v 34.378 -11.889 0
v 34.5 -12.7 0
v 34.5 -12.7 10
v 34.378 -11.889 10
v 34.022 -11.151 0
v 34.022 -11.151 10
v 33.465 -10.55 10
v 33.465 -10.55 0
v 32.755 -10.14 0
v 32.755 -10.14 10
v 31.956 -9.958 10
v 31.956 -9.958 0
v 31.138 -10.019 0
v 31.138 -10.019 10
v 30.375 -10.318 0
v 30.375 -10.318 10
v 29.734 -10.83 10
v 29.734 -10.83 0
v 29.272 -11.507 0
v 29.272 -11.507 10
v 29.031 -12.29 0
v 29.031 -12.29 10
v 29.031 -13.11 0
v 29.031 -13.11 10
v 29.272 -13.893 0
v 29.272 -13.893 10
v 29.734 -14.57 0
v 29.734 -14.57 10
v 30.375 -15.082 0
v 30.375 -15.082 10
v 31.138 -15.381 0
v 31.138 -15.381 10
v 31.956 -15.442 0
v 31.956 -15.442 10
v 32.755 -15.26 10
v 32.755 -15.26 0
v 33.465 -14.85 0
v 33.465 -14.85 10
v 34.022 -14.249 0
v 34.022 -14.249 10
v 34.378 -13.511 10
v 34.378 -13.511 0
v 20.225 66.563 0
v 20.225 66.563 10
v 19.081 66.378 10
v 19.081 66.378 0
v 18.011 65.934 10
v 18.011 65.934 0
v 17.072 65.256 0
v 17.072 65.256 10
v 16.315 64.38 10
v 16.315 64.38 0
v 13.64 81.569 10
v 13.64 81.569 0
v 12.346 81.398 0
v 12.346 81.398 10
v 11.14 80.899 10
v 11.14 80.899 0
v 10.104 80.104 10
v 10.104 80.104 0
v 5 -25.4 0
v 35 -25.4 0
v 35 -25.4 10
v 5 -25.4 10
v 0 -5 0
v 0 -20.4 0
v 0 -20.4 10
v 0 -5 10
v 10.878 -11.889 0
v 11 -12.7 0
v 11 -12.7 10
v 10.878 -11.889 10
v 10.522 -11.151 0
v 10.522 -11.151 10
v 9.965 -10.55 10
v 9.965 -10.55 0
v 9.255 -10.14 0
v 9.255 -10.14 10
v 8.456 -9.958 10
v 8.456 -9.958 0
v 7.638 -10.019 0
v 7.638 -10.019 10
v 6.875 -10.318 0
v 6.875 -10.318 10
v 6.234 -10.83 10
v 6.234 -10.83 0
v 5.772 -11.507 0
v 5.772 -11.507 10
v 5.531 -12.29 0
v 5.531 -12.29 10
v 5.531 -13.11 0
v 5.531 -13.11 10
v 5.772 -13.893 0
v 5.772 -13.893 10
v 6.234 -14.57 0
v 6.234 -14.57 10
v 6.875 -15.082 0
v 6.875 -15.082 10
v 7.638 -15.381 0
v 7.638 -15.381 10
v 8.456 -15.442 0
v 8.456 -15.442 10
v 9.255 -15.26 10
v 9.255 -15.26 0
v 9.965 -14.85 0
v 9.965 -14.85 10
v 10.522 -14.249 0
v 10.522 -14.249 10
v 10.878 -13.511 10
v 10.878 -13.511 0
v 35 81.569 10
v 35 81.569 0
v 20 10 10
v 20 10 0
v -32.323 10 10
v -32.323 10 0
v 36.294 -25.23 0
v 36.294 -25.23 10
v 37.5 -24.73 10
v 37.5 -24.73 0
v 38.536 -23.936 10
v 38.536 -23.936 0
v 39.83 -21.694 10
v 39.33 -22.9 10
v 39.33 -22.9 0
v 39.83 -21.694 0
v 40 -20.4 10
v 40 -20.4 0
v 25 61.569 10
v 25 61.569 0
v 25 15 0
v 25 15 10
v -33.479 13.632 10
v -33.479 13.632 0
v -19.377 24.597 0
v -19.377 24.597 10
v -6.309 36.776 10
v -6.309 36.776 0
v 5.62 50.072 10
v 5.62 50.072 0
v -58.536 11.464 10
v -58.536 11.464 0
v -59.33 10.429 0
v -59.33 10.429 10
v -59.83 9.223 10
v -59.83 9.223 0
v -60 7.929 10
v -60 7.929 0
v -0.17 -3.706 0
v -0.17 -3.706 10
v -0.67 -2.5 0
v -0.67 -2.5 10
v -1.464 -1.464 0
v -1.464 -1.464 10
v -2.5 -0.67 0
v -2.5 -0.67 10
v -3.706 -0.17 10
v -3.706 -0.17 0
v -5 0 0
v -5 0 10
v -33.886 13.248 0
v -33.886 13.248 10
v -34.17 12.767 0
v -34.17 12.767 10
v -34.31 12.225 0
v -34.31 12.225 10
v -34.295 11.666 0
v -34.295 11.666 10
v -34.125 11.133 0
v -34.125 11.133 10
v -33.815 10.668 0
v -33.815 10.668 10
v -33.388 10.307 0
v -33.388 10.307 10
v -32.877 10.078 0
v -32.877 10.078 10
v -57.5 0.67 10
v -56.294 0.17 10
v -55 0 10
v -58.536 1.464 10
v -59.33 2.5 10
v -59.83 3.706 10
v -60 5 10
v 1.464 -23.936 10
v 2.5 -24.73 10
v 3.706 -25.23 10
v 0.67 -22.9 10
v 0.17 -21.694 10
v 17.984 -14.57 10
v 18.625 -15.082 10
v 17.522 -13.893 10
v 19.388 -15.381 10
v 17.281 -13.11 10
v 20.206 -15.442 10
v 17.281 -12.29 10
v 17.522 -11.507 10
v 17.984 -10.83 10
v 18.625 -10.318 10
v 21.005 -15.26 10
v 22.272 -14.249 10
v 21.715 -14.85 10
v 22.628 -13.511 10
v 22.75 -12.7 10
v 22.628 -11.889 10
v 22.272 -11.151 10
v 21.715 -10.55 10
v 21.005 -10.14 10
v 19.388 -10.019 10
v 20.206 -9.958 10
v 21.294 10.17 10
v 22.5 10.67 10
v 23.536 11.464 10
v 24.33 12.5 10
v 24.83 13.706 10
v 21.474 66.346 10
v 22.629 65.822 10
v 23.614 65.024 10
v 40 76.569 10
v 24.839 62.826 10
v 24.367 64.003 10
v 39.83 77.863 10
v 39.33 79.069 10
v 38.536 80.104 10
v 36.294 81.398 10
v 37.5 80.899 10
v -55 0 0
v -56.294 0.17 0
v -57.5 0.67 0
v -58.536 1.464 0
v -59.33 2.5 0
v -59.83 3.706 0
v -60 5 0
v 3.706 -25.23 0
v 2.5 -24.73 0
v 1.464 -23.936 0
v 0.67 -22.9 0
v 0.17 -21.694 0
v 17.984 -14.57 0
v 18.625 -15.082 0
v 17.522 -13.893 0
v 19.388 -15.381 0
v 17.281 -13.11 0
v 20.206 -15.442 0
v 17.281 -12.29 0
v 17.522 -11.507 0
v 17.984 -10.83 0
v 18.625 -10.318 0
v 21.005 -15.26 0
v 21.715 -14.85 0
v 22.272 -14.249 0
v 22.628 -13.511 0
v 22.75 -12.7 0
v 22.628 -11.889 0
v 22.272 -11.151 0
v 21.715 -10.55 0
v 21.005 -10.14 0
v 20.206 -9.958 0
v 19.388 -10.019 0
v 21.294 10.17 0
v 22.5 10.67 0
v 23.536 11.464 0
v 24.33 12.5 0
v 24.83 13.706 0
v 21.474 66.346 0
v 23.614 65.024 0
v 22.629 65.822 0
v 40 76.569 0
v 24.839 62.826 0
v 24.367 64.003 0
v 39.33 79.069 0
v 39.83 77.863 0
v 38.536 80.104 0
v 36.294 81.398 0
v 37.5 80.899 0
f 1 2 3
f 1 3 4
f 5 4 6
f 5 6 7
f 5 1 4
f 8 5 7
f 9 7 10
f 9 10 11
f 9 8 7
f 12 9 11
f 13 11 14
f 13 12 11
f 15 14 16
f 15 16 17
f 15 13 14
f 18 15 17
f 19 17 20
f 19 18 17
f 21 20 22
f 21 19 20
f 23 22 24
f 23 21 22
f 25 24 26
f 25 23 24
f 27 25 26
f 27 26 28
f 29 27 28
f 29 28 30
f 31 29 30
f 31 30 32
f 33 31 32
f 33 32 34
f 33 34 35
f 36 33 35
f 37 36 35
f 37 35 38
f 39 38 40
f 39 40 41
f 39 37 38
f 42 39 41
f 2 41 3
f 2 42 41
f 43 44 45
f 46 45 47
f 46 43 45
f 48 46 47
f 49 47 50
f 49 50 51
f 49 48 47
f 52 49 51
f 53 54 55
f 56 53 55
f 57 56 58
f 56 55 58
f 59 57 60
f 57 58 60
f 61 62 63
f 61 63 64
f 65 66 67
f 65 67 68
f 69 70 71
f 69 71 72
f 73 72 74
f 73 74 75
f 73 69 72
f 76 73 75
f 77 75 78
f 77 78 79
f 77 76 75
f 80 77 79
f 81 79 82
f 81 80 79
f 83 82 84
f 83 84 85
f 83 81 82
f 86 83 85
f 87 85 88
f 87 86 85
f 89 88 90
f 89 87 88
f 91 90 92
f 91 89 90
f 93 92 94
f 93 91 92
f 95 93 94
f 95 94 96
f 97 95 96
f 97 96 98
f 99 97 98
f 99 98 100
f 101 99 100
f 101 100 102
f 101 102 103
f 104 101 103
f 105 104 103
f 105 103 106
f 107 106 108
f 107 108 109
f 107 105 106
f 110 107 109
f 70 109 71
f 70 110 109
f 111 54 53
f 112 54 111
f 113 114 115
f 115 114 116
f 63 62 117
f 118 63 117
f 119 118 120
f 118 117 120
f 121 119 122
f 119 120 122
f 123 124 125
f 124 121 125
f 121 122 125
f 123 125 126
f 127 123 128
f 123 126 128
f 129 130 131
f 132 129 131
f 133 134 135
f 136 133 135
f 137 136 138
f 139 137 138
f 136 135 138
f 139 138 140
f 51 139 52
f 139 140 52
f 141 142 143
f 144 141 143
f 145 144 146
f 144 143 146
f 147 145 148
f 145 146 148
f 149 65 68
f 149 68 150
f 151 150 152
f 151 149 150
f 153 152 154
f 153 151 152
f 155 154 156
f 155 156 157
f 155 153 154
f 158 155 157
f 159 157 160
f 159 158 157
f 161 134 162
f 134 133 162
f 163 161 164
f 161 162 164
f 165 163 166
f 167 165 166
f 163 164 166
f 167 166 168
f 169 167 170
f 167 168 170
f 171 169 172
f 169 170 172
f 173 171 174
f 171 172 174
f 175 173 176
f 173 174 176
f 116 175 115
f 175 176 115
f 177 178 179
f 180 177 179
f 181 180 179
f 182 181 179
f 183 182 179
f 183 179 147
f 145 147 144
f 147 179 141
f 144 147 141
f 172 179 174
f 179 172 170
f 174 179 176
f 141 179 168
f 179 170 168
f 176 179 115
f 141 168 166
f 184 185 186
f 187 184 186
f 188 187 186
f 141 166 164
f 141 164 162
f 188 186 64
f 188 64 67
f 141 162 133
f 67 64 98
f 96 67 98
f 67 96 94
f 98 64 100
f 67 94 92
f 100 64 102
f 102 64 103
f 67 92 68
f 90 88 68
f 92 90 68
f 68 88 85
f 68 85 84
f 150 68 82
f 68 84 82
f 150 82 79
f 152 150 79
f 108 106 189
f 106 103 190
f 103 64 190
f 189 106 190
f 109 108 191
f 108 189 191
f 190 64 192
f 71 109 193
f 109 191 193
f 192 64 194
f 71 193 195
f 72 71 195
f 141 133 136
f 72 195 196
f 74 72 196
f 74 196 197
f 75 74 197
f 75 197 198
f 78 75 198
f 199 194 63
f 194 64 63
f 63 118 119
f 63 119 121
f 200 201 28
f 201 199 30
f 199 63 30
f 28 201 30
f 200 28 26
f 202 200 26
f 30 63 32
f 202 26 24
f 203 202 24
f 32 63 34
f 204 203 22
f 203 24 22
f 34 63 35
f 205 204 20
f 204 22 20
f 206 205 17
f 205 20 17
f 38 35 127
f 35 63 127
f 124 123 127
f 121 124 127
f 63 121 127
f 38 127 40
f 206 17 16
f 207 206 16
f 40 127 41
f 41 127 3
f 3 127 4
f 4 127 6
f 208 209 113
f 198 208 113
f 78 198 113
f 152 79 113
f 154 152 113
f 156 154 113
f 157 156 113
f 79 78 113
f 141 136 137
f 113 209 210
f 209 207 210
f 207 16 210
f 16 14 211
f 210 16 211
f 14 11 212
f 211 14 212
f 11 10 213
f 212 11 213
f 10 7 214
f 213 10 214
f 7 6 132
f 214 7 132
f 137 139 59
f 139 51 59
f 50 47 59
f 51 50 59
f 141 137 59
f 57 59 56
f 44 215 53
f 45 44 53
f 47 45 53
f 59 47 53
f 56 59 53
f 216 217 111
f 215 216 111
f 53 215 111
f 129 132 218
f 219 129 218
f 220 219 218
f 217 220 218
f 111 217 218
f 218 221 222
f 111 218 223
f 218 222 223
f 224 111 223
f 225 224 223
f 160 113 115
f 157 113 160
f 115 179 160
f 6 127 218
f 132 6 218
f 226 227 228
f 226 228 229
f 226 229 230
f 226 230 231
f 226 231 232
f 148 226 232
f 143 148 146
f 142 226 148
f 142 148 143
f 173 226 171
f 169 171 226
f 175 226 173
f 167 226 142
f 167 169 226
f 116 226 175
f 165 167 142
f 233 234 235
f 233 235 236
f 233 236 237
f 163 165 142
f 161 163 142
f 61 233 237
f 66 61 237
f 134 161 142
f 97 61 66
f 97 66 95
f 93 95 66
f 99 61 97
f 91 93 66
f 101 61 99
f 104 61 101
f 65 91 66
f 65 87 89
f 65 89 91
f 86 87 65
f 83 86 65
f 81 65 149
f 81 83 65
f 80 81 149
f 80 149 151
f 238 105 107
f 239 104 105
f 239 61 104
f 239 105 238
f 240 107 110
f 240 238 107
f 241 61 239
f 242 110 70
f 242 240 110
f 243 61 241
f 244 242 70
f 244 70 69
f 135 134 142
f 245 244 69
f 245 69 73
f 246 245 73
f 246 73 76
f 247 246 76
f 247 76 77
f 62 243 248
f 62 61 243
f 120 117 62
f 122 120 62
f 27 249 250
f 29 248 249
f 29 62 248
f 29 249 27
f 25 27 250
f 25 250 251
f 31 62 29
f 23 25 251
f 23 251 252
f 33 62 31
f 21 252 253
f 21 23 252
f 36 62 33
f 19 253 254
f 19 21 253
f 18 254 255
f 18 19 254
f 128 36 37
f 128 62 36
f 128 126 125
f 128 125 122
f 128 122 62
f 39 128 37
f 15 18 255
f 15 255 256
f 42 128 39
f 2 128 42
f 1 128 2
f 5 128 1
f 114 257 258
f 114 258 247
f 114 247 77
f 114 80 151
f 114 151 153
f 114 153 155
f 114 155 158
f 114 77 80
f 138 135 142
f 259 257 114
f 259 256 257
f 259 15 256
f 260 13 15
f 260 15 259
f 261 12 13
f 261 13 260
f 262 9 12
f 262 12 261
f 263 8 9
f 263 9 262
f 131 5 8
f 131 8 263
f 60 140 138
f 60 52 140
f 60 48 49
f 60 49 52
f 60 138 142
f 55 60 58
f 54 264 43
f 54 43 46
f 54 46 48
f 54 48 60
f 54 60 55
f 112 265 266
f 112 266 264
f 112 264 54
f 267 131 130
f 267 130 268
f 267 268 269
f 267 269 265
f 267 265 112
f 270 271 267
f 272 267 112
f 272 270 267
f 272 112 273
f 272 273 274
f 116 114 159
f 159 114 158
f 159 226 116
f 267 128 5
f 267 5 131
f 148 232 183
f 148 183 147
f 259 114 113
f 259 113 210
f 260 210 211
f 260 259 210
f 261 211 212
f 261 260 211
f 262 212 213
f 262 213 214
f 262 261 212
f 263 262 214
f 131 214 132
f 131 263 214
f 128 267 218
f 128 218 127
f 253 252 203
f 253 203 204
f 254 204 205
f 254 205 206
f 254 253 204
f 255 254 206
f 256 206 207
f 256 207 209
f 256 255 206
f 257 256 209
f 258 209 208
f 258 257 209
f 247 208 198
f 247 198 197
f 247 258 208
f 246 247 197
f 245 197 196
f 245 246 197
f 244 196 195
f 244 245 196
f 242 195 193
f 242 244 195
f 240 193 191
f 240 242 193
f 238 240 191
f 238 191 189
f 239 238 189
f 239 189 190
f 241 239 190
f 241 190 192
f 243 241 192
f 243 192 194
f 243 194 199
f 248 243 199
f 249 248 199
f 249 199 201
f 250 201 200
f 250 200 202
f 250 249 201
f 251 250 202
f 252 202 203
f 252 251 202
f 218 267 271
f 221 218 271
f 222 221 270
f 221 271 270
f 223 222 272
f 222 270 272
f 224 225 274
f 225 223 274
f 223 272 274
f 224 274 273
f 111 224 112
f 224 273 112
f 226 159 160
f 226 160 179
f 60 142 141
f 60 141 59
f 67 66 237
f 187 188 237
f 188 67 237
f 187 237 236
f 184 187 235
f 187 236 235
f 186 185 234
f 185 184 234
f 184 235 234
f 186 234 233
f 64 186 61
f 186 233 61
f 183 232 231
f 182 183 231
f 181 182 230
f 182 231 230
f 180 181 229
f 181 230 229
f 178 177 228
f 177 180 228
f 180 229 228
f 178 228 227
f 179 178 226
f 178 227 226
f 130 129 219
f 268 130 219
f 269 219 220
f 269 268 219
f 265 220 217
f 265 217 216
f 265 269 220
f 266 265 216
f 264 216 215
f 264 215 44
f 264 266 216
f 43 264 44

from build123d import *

# Parameters (mm, degrees)
SKETCH1_R           = 2.75
BOSS_EXTRUDE1_DEPTH = 10
FILLET1_R           = 5
FILLET2_R           = 2


with BuildPart() as part:
    # Sketch1 → Boss-Extrude1 (new body)
    with BuildSketch(Plane.XY):
        Polygon((-60, 10), (11.568542495, 81.568542495), (40, 81.568542495), (40, -25.4), (0, -25.4), (0, 0), (-60, 0), align=None)
        with Locations((8.25, -12.7)):
            Circle(SKETCH1_R, mode=Mode.SUBTRACT)
        with Locations((20, -12.7)):
            Circle(SKETCH1_R, mode=Mode.SUBTRACT)
        with Locations((31.75, -12.7)):
            Circle(SKETCH1_R, mode=Mode.SUBTRACT)
        with BuildLine():
            Line((17.781745931, 66.568542495), (25, 66.568542495))
            Line((25, 66.568542495), (25, 10))
            Line((25, 10), (-38.786796564, 10))
            ThreePointArc((-38.786796564, 10), (-7.645233685, 35.426979616), (17.781745931, 66.568542495))
        make_face(mode=Mode.SUBTRACT)
    extrude(amount=BOSS_EXTRUDE1_DEPTH)

    # Fillet1
    # the kernel refuses this fillet: 5 mm, written as the material it adds along each edge
    with BuildSketch(Plane(origin=(17.781745931, 66.568542495, 0), x_dir=(-0.556881790774907, -0.8305917595927212, 0), z_dir=(0, 0, 1))) as fillet1_piece_1:
        with BuildLine():
            CenterArc((2.667557701, 4.999891542), FILLET1_R, 213.840425913, 55.782189142)
            Line((-1.485401097, 2.215482588), (0, 0))
            ThreePointArc((0, 0), (1.317312445, 0.004338327), (2.63462489, 0))
        make_face()
    extrude(amount=10)
    with BuildSketch(Plane(origin=(25, 66.568542495, 0), x_dir=(0, -1, 0), z_dir=(0, 0, 1)), Plane(origin=(25, 10, 0), x_dir=(-1, 0, 0), z_dir=(0, 0, 1)), Plane(origin=(0, 0, 0), x_dir=(0, -1, 0), z_dir=(0, 0, 1))) as fillet1_piece_2:
        with BuildLine():
            CenterArc((FILLET1_R, -FILLET1_R), FILLET1_R, 90, 90)
            Line((0, -FILLET1_R), (0, 0))
            Line((0, 0), (FILLET1_R, 0))
        make_face()
    extrude(amount=10)
    # the kernel refuses this fillet: 5 mm, written as the material it takes off along each edge
    with BuildSketch(Plane(origin=(-60, 0, -12.5), x_dir=(0, 1, 0), z_dir=(0, 0, 1))) as fillet1_2_piece_1:
        with BuildLine():
            CenterArc((FILLET1_R, -FILLET1_R), FILLET1_R, 90, 90)
            Line((0, -FILLET1_R), (0, 0))
            Line((0, 0), (FILLET1_R, 0))
        make_face()
    extrude(amount=35, mode=Mode.SUBTRACT)
    with BuildSketch(Plane(origin=(-60, 10, -5.17766953), x_dir=(0.7071067811865476, 0.7071067811865476, 0), z_dir=(0, 0, 1))) as fillet1_2_piece_2:
        with BuildLine():
            CenterArc((FILLET1_R * 0.414213562373, -FILLET1_R), FILLET1_R, 90, 45)
            Line((-FILLET1_R * 0.292893218813, -FILLET1_R * 0.292893218813), (0, 0))
            Line((0, 0), (FILLET1_R * 0.414213562373, 0))
        make_face()
    extrude(amount=20.355339059, mode=Mode.SUBTRACT)
    with BuildSketch(Plane(origin=(0, -25.4, -12.5), x_dir=(1, 0, 0), z_dir=(0, 0, 1)), Plane(origin=(40, -25.4, -12.5), x_dir=(0, 1, 0), z_dir=(0, 0, 1)), Plane(origin=(40, 81.568542495, -12.5), x_dir=(-1, 0, 0), z_dir=(0, 0, 1))) as fillet1_2_piece_3:
        with BuildLine():
            CenterArc((FILLET1_R, FILLET1_R), FILLET1_R, 180, 90)
            Line((0, FILLET1_R), (0, 0))
            Line((0, 0), (FILLET1_R, 0))
        make_face()
    extrude(amount=35, mode=Mode.SUBTRACT)
    with BuildSketch(Plane(origin=(11.568542495, 81.568542495, -5.17766953), x_dir=(-0.7071067811865509, -0.707106781186544, 0), z_dir=(0, 0, 1))) as fillet1_2_piece_4:
        with BuildLine():
            CenterArc((FILLET1_R * 0.414213562373, FILLET1_R), FILLET1_R, 225, 45)
            Line((-FILLET1_R * 0.292893218813, FILLET1_R * 0.292893218813), (0, 0))
            Line((0, 0), (FILLET1_R * 0.414213562373, 0))
        make_face()
    extrude(amount=20.355339059, mode=Mode.SUBTRACT)

    # Fillet2
    fillet2_edges = [part.edges().sort_by_distance(p)[0] for p in [
        (-38.786796564, 10, 5),
    ]]
    fillet(fillet2_edges, radius=FILLET2_R)


solid = part.part
